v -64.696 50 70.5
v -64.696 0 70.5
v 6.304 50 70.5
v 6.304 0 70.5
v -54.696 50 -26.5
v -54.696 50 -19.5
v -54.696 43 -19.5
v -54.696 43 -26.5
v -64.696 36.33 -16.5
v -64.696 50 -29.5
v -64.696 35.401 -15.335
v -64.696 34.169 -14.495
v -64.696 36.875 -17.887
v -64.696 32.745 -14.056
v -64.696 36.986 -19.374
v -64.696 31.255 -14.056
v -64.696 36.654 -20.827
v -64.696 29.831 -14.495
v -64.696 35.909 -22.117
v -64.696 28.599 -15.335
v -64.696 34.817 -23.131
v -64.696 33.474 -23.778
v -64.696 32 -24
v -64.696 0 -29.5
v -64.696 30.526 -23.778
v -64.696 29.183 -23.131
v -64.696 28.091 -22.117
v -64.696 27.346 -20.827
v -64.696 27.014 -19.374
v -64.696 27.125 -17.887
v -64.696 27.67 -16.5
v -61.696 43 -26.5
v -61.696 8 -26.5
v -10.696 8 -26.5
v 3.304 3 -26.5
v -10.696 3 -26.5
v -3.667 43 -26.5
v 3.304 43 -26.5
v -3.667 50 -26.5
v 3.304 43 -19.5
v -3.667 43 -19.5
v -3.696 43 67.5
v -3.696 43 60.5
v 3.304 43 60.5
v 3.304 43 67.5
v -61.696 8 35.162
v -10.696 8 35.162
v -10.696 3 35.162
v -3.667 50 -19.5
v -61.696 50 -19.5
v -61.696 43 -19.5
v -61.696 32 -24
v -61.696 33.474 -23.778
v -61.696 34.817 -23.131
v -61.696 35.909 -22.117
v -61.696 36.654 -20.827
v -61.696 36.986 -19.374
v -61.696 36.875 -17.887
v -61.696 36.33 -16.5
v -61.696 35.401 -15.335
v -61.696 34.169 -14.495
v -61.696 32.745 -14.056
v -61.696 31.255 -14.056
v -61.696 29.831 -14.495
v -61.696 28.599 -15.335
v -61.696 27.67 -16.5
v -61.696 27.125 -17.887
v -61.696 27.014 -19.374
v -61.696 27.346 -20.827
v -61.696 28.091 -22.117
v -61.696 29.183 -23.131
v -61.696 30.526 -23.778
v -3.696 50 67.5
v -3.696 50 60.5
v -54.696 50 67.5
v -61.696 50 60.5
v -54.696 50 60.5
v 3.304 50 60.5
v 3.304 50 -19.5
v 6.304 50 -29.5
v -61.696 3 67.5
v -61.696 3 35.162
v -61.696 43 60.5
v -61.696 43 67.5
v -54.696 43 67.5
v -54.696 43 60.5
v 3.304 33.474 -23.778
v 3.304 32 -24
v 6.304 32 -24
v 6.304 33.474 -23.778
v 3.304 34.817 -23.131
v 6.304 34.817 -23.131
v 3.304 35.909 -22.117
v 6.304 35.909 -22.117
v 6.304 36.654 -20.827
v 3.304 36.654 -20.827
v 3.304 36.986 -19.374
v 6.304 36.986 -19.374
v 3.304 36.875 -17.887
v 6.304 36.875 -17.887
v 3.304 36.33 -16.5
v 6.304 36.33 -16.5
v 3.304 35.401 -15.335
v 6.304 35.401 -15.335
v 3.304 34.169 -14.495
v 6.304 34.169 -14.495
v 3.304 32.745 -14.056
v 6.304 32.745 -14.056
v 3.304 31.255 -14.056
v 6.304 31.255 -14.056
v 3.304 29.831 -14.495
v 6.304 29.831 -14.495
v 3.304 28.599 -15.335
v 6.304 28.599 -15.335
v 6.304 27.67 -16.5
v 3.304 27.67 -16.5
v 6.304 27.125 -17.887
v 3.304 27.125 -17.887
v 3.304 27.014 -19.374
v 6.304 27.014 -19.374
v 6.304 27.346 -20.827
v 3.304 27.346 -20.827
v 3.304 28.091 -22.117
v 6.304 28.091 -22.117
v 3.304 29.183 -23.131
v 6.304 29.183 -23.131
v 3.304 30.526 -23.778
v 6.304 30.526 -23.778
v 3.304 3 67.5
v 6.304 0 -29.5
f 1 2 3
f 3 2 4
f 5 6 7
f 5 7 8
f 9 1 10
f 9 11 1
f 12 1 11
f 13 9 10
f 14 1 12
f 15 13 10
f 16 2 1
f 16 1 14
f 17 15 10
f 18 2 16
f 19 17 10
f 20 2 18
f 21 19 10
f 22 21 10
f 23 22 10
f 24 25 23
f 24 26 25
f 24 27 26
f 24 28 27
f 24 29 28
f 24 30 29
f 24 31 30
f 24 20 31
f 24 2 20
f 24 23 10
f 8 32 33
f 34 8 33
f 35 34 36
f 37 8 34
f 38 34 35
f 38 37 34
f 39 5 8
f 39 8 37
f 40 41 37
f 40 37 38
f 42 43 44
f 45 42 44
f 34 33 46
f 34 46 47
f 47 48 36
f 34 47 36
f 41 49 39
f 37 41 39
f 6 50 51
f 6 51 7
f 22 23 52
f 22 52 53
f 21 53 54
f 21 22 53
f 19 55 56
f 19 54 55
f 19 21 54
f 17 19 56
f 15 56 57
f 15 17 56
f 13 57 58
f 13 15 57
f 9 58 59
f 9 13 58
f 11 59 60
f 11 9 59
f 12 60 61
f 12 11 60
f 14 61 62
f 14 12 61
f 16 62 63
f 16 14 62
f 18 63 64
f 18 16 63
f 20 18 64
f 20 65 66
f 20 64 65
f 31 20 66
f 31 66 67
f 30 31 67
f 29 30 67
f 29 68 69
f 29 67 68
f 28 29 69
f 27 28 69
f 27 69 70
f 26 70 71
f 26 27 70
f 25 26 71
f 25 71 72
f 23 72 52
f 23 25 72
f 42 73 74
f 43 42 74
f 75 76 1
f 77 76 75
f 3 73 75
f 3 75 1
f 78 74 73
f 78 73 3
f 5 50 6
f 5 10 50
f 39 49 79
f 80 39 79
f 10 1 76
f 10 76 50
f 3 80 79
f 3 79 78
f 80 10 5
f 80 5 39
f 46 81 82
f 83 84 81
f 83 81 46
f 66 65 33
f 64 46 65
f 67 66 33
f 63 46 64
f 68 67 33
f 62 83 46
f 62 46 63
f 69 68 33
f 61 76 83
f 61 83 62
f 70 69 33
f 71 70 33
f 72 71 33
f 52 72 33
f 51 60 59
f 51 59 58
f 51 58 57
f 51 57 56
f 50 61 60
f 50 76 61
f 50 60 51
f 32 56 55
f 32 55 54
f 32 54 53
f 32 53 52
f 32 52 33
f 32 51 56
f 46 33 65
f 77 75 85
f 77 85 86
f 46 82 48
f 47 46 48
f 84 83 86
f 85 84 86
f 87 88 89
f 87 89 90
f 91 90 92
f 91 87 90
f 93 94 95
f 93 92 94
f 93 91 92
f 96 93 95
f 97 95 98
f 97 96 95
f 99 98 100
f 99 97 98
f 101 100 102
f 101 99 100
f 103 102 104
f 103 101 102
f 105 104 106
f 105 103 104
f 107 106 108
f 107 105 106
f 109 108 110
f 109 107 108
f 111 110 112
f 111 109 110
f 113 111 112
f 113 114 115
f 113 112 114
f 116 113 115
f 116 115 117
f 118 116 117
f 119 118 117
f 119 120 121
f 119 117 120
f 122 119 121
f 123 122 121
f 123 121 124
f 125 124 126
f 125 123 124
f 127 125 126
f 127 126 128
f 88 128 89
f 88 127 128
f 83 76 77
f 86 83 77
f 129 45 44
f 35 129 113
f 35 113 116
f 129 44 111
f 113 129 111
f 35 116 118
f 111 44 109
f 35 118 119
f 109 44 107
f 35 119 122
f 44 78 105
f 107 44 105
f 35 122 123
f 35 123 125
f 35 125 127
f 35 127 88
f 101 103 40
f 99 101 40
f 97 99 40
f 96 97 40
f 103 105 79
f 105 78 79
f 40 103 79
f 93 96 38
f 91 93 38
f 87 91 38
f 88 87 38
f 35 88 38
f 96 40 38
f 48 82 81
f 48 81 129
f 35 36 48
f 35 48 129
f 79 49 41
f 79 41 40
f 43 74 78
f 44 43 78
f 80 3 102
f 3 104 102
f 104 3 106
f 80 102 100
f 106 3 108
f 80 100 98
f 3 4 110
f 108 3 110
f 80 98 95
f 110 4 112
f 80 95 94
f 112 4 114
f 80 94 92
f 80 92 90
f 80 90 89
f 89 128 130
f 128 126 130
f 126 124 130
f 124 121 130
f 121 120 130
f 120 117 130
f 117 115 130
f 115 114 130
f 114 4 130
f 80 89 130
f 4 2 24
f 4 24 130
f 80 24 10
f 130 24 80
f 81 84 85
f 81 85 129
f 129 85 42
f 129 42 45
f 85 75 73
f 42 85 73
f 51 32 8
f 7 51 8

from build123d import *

# Parameters (mm, degrees)
SKETCH1_W               = 71
SKETCH1_H               = 100
BOSS_EXTRUDE1_DEPTH     = 50
SKETCH2_W               = 65
SKETCH2_H               = 94
CUT_EXTRUDE1_DEPTH      = 47
SKETCH3_W               = 51
SKETCH3_H               = 61.662084765
BOSS_EXTRUDE2_DEPTH     = 5
CUT_EXTRUDE2_DEPTH      = 110.973860531
CUT_EXTRUDE2_DEPTH_BACK = 110.973860531
SKETCH4_R               = 5
SKETCH5_W               = 10
SKETCH5_H               = 10
SKETCH5_W_2             = 9.971264926
BOSS_EXTRUDE3_DEPTH     = 7


with BuildPart() as part:
    # Sketch1 → Boss-Extrude1 (new body)
    with BuildSketch(Plane(origin=(0, 0, 0), x_dir=(1, 0, 0), z_dir=(0, 1, 0))):
        with Locations((-29.196168954, -20.5)):
            Rectangle(SKETCH1_W, SKETCH1_H)
    extrude(amount=BOSS_EXTRUDE1_DEPTH)

    # Sketch2 → Cut-Extrude1 (cut)
    with BuildSketch(Plane(origin=(0, 50, 0), x_dir=(1, 0, 0), z_dir=(0, 1, 0))):
        with Locations((-29.196168954, -20.5)):
            Rectangle(SKETCH2_W, SKETCH2_H)
    extrude(amount=-CUT_EXTRUDE1_DEPTH, mode=Mode.SUBTRACT)

    # Sketch3 → Boss-Extrude2 (add)
    with BuildSketch(Plane(origin=(0, 3, 0), x_dir=(1, 0, 0), z_dir=(0, 1, 0))):
        with Locations((-36.196168954, -4.331042383)):
            Rectangle(SKETCH3_W, SKETCH3_H)
    extrude(amount=BOSS_EXTRUDE2_DEPTH)

    # Sketch4 → Cut-Extrude2 (cut, two sides: drawn at the far end of the back side and taken through both)
    with BuildSketch(Plane(origin=(-61.696168954, 0, 0), x_dir=(0, 0, -1), z_dir=(1, 0, 0)).offset(-CUT_EXTRUDE2_DEPTH_BACK)):
        with Locations((19, 32)):
            Circle(SKETCH4_R)
    extrude(amount=CUT_EXTRUDE2_DEPTH + CUT_EXTRUDE2_DEPTH_BACK, mode=Mode.SUBTRACT)

    # Sketch5 → Boss-Extrude3 (add)
    with BuildSketch(Plane(origin=(0, 50, 0), x_dir=(1, 0, 0), z_dir=(0, 1, 0))):
        with Locations((-59.696168954, 24.5)):
            Rectangle(SKETCH5_W, SKETCH5_H)
        with Locations((1.318198583, 24.5)):
            Rectangle(SKETCH5_W_2, SKETCH5_H)
        with Locations((1.303831046, -65.5)):
            Rectangle(SKETCH5_W, SKETCH5_H)
        with Locations((-59.696168954, -65.5)):
            Rectangle(SKETCH5_W, SKETCH5_H)
    extrude(amount=-BOSS_EXTRUDE3_DEPTH)


solid = part.part
